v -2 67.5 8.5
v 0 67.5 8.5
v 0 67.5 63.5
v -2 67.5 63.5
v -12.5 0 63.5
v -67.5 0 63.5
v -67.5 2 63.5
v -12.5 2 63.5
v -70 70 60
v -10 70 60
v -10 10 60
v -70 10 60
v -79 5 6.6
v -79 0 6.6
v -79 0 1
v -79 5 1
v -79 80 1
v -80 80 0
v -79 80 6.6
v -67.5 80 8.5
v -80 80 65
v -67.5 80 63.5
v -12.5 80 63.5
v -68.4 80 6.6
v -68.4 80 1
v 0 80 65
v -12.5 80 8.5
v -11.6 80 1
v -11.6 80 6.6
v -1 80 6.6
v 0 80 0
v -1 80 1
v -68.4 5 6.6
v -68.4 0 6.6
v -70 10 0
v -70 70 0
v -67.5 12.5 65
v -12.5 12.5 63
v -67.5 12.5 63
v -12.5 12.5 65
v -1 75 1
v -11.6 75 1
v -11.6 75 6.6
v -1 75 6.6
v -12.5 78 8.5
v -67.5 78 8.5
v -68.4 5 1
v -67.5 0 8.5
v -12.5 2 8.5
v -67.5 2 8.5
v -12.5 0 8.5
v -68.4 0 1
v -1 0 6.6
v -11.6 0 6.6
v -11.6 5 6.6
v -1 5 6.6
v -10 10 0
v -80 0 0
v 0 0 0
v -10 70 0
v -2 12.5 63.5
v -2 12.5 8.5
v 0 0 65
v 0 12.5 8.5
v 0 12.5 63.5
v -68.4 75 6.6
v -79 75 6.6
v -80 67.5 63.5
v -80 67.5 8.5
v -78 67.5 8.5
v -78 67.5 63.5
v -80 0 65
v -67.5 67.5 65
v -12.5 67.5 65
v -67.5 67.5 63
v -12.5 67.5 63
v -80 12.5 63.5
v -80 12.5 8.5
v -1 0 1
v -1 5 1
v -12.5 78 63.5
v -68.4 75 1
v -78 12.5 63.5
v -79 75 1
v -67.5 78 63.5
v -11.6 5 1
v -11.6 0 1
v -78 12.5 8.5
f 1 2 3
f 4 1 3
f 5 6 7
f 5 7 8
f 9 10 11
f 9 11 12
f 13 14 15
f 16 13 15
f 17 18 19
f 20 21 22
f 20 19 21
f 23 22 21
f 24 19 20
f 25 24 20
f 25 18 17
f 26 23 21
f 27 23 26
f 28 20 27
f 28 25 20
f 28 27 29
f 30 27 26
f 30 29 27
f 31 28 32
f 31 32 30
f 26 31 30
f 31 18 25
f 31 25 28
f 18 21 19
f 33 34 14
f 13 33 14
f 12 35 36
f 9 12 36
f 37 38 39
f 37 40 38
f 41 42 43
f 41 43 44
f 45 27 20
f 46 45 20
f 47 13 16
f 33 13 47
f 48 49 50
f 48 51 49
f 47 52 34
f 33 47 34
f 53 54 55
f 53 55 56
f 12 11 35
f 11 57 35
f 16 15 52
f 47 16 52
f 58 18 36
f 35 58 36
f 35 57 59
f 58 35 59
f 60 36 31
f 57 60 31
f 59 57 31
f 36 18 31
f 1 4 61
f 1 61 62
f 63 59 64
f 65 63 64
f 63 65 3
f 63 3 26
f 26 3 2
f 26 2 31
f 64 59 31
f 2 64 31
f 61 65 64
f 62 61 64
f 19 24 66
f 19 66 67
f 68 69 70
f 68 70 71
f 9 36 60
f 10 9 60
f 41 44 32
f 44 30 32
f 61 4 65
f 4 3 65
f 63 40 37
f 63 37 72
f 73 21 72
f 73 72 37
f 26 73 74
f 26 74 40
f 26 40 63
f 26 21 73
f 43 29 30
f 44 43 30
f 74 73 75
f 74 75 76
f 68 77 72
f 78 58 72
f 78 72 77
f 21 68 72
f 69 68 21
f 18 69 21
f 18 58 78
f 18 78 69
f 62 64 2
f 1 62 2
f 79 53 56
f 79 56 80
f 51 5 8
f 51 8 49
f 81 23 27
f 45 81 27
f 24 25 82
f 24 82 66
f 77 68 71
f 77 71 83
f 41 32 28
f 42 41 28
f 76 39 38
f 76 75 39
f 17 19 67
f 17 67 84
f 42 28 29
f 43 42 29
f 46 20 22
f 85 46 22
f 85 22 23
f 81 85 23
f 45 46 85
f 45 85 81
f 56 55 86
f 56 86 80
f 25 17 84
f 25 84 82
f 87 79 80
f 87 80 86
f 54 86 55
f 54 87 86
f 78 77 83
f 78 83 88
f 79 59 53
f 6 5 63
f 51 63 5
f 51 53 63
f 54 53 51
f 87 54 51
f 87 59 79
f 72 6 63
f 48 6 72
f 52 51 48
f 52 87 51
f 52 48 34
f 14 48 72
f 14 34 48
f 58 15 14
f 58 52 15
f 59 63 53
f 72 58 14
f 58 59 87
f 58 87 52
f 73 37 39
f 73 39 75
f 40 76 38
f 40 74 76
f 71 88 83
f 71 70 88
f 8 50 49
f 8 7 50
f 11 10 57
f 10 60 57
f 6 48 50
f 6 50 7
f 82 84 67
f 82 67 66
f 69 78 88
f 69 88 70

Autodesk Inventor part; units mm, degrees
ref_plane "YZ Plane" through (0, 0, 0) normal (1, 0, 0) x (0, 1, 0)
ref_plane "XZ Plane" through (0, 0, 0) normal (0, 1, 0) x (-1, 0, 0)
ref_plane "XY Plane" through (0, 0, 0) normal (0, 0, 1) x (1, 0, 0)
sketch "Sketch7" plane through (0, 0, 0) normal (0, 0, 1) x (1, 0, 0)
  line L0 (0, 0) -> (-80, 0)
  line L1 (-80, 0) -> (-80, 80)
  line L2 (-80, 80) -> (0, 80)
  line L3 (0, 80) -> (0, 0)
  line L4 (-70, 10) -> (-10, 10)
  line L5 (-10, 10) -> (-10, 70)
  line L6 (-10, 70) -> (-70, 70)
  line L7 (-70, 70) -> (-70, 10)
  dimension "d54" = 80
  dimension "d55" = 80
  dimension "d110" = 60
  dimension "d111" = 60
extrude "Extrusion10" add sketch "Sketch7" along normal blind 60 contours L0 L1 L2 L3 | L7 L6 L5 L4
sketch "Sketch8" plane through (0, 0, 60) normal (0, 0, 1) x (1, 0, 0)
  line L0 (0, 0) -> (0, 80) projected
  line L1 (0, 0) -> (-80, 0)
  line L2 (-80, 0) -> (-80, 80)
  line L3 (-80, 80) -> (0, 80)
  line L4 (0, 80) -> (0, 0)
  dimension "d60" = 80
  dimension "d61" = 80
extrude "Extrusion11" add sketch "Sketch8" along normal blind 5
sketch "Sketch9" plane through (0, 0, 65) normal (0, 0, 1) x (1, 0, 0)
  line L0 (-12.5, 12.5) -> (-67.5, 12.5)
  line L1 (-67.5, 12.5) -> (-67.5, 67.5)
  line L2 (-67.5, 67.5) -> (-12.5, 67.5)
  line L3 (-12.5, 67.5) -> (-12.5, 12.5)
  point P0 (0, 0)
  dimension "d64" = 55
  dimension "d65" = 55
extrude "Extrusion12" cut sketch "Sketch9" against normal blind 2
sketch "Sketch10" plane through (0, 0, 0) normal (1, 0, 0) x (0, 0, -1)
  line L0 (-63.5, 12.5) -> (-8.5, 12.5)
  line L1 (-8.5, 12.5) -> (-8.5, 67.5)
  line L2 (-8.5, 67.5) -> (-63.5, 67.5)
  line L3 (-63.5, 67.5) -> (-63.5, 12.5)
  point P0 (0, 0)
  dimension "d68" = 55
  dimension "d69" = 55
extrude "Extrusion13" cut sketch "Sketch10" against normal blind 2
sketch "Sketch11" plane through (-80, 80, 0) normal (0, 1, 0) x (1, 0, 0)
  line L0 (12.5, -63.5) -> (67.5, -63.5)
  line L1 (67.5, -63.5) -> (67.5, -8.5)
  line L2 (67.5, -8.5) -> (12.5, -8.5)
  line L3 (12.5, -8.5) -> (12.5, -63.5)
  point P0 (80, 0)
  dimension "d72" = 55
  dimension "d73" = 55
sketch "Sketch12" plane through (-80, 0, 0) normal (-1, 0, 0) x (0, 0, 1)
  line L0 (63.5, 12.5) -> (8.5, 12.5)
  line L1 (8.5, 12.5) -> (8.5, 67.5)
  line L2 (8.5, 67.5) -> (63.5, 67.5)
  line L3 (63.5, 67.5) -> (63.5, 12.5)
  point P0 (0, 0)
  dimension "d74" = 55
  dimension "d75" = 55
sketch "Sketch13" plane through (-80, 0, 0) normal (0, -1, 0) x (1, 0, 0)
  line L0 (12.5, 63.5) -> (67.5, 63.5)
  line L1 (67.5, 63.5) -> (67.5, 8.5)
  line L2 (67.5, 8.5) -> (12.5, 8.5)
  line L3 (12.5, 8.5) -> (12.5, 63.5)
  point P0 (80, 0)
  dimension "d76" = 55
  dimension "d77" = 55
extrude "Extrusion14" cut sketch "Sketch11" against normal blind 2
extrude "Extrusion15" cut sketch "Sketch12" against normal blind 2
extrude "Extrusion16" cut sketch "Sketch13" against normal blind 2
sketch "Sketch14" plane through (-80, 80, 0) normal (0, 1, 0) x (1, 0, 0)
  line L0 (79, -1) -> (68.4, -1)
  line L1 (68.4, -1) -> (68.4, -6.6)
  line L2 (68.4, -6.6) -> (79, -6.6)
  line L3 (79, -6.6) -> (79, -1)
  line L4 (1, -1) -> (11.6, -1)
  line L5 (11.6, -1) -> (11.6, -6.6)
  line L6 (11.6, -6.6) -> (1, -6.6)
  line L7 (1, -6.6) -> (1, -1)
  point P0 (80, 0)
  dimension "d84" = 10.6
  dimension "d85" = 5.6
  dimension "d86" = 10.6
  dimension "d87" = 5.6
extrude "Extrusion17" cut sketch "Sketch14" against normal blind 5
sketch "Sketch16" plane through (-80, 0, 0) normal (0, -1, 0) x (1, 0, 0)
  line L0 (1, 1) -> (11.6, 1)
  line L1 (11.6, 1) -> (11.6, 6.6)
  line L2 (11.6, 6.6) -> (1, 6.6)
  line L3 (1, 6.6) -> (1, 1)
  line L4 (79, 1) -> (68.4, 1)
  line L5 (68.4, 1) -> (68.4, 6.6)
  line L6 (68.4, 6.6) -> (79, 6.6)
  line L7 (79, 6.6) -> (79, 1)
  point P0 (80, 0)
  dimension "d94" = 10.6
  dimension "d95" = 5.6
  dimension "d96" = 10.6
  dimension "d97" = 5.6
extrude "Extrusion19" cut sketch "Sketch16" against normal blind 5
sketch "Sketch18" plane through (0, 0, 0) normal (0, 0, -1) x (-1, 0, 0)
  line L0 (10, 10) -> (70, 10)
  line L1 (70, 10) -> (70, 70)
  line L2 (70, 70) -> (10, 70)
  line L3 (10, 70) -> (10, 10)
  point P0 (0, 0)
  dimension "d114" = 60
  dimension "d115" = 60
extrude "Extrusion21" cut sketch "Sketch18" against normal blind 60
properties part number "Joint_MarkerCube_V3"
